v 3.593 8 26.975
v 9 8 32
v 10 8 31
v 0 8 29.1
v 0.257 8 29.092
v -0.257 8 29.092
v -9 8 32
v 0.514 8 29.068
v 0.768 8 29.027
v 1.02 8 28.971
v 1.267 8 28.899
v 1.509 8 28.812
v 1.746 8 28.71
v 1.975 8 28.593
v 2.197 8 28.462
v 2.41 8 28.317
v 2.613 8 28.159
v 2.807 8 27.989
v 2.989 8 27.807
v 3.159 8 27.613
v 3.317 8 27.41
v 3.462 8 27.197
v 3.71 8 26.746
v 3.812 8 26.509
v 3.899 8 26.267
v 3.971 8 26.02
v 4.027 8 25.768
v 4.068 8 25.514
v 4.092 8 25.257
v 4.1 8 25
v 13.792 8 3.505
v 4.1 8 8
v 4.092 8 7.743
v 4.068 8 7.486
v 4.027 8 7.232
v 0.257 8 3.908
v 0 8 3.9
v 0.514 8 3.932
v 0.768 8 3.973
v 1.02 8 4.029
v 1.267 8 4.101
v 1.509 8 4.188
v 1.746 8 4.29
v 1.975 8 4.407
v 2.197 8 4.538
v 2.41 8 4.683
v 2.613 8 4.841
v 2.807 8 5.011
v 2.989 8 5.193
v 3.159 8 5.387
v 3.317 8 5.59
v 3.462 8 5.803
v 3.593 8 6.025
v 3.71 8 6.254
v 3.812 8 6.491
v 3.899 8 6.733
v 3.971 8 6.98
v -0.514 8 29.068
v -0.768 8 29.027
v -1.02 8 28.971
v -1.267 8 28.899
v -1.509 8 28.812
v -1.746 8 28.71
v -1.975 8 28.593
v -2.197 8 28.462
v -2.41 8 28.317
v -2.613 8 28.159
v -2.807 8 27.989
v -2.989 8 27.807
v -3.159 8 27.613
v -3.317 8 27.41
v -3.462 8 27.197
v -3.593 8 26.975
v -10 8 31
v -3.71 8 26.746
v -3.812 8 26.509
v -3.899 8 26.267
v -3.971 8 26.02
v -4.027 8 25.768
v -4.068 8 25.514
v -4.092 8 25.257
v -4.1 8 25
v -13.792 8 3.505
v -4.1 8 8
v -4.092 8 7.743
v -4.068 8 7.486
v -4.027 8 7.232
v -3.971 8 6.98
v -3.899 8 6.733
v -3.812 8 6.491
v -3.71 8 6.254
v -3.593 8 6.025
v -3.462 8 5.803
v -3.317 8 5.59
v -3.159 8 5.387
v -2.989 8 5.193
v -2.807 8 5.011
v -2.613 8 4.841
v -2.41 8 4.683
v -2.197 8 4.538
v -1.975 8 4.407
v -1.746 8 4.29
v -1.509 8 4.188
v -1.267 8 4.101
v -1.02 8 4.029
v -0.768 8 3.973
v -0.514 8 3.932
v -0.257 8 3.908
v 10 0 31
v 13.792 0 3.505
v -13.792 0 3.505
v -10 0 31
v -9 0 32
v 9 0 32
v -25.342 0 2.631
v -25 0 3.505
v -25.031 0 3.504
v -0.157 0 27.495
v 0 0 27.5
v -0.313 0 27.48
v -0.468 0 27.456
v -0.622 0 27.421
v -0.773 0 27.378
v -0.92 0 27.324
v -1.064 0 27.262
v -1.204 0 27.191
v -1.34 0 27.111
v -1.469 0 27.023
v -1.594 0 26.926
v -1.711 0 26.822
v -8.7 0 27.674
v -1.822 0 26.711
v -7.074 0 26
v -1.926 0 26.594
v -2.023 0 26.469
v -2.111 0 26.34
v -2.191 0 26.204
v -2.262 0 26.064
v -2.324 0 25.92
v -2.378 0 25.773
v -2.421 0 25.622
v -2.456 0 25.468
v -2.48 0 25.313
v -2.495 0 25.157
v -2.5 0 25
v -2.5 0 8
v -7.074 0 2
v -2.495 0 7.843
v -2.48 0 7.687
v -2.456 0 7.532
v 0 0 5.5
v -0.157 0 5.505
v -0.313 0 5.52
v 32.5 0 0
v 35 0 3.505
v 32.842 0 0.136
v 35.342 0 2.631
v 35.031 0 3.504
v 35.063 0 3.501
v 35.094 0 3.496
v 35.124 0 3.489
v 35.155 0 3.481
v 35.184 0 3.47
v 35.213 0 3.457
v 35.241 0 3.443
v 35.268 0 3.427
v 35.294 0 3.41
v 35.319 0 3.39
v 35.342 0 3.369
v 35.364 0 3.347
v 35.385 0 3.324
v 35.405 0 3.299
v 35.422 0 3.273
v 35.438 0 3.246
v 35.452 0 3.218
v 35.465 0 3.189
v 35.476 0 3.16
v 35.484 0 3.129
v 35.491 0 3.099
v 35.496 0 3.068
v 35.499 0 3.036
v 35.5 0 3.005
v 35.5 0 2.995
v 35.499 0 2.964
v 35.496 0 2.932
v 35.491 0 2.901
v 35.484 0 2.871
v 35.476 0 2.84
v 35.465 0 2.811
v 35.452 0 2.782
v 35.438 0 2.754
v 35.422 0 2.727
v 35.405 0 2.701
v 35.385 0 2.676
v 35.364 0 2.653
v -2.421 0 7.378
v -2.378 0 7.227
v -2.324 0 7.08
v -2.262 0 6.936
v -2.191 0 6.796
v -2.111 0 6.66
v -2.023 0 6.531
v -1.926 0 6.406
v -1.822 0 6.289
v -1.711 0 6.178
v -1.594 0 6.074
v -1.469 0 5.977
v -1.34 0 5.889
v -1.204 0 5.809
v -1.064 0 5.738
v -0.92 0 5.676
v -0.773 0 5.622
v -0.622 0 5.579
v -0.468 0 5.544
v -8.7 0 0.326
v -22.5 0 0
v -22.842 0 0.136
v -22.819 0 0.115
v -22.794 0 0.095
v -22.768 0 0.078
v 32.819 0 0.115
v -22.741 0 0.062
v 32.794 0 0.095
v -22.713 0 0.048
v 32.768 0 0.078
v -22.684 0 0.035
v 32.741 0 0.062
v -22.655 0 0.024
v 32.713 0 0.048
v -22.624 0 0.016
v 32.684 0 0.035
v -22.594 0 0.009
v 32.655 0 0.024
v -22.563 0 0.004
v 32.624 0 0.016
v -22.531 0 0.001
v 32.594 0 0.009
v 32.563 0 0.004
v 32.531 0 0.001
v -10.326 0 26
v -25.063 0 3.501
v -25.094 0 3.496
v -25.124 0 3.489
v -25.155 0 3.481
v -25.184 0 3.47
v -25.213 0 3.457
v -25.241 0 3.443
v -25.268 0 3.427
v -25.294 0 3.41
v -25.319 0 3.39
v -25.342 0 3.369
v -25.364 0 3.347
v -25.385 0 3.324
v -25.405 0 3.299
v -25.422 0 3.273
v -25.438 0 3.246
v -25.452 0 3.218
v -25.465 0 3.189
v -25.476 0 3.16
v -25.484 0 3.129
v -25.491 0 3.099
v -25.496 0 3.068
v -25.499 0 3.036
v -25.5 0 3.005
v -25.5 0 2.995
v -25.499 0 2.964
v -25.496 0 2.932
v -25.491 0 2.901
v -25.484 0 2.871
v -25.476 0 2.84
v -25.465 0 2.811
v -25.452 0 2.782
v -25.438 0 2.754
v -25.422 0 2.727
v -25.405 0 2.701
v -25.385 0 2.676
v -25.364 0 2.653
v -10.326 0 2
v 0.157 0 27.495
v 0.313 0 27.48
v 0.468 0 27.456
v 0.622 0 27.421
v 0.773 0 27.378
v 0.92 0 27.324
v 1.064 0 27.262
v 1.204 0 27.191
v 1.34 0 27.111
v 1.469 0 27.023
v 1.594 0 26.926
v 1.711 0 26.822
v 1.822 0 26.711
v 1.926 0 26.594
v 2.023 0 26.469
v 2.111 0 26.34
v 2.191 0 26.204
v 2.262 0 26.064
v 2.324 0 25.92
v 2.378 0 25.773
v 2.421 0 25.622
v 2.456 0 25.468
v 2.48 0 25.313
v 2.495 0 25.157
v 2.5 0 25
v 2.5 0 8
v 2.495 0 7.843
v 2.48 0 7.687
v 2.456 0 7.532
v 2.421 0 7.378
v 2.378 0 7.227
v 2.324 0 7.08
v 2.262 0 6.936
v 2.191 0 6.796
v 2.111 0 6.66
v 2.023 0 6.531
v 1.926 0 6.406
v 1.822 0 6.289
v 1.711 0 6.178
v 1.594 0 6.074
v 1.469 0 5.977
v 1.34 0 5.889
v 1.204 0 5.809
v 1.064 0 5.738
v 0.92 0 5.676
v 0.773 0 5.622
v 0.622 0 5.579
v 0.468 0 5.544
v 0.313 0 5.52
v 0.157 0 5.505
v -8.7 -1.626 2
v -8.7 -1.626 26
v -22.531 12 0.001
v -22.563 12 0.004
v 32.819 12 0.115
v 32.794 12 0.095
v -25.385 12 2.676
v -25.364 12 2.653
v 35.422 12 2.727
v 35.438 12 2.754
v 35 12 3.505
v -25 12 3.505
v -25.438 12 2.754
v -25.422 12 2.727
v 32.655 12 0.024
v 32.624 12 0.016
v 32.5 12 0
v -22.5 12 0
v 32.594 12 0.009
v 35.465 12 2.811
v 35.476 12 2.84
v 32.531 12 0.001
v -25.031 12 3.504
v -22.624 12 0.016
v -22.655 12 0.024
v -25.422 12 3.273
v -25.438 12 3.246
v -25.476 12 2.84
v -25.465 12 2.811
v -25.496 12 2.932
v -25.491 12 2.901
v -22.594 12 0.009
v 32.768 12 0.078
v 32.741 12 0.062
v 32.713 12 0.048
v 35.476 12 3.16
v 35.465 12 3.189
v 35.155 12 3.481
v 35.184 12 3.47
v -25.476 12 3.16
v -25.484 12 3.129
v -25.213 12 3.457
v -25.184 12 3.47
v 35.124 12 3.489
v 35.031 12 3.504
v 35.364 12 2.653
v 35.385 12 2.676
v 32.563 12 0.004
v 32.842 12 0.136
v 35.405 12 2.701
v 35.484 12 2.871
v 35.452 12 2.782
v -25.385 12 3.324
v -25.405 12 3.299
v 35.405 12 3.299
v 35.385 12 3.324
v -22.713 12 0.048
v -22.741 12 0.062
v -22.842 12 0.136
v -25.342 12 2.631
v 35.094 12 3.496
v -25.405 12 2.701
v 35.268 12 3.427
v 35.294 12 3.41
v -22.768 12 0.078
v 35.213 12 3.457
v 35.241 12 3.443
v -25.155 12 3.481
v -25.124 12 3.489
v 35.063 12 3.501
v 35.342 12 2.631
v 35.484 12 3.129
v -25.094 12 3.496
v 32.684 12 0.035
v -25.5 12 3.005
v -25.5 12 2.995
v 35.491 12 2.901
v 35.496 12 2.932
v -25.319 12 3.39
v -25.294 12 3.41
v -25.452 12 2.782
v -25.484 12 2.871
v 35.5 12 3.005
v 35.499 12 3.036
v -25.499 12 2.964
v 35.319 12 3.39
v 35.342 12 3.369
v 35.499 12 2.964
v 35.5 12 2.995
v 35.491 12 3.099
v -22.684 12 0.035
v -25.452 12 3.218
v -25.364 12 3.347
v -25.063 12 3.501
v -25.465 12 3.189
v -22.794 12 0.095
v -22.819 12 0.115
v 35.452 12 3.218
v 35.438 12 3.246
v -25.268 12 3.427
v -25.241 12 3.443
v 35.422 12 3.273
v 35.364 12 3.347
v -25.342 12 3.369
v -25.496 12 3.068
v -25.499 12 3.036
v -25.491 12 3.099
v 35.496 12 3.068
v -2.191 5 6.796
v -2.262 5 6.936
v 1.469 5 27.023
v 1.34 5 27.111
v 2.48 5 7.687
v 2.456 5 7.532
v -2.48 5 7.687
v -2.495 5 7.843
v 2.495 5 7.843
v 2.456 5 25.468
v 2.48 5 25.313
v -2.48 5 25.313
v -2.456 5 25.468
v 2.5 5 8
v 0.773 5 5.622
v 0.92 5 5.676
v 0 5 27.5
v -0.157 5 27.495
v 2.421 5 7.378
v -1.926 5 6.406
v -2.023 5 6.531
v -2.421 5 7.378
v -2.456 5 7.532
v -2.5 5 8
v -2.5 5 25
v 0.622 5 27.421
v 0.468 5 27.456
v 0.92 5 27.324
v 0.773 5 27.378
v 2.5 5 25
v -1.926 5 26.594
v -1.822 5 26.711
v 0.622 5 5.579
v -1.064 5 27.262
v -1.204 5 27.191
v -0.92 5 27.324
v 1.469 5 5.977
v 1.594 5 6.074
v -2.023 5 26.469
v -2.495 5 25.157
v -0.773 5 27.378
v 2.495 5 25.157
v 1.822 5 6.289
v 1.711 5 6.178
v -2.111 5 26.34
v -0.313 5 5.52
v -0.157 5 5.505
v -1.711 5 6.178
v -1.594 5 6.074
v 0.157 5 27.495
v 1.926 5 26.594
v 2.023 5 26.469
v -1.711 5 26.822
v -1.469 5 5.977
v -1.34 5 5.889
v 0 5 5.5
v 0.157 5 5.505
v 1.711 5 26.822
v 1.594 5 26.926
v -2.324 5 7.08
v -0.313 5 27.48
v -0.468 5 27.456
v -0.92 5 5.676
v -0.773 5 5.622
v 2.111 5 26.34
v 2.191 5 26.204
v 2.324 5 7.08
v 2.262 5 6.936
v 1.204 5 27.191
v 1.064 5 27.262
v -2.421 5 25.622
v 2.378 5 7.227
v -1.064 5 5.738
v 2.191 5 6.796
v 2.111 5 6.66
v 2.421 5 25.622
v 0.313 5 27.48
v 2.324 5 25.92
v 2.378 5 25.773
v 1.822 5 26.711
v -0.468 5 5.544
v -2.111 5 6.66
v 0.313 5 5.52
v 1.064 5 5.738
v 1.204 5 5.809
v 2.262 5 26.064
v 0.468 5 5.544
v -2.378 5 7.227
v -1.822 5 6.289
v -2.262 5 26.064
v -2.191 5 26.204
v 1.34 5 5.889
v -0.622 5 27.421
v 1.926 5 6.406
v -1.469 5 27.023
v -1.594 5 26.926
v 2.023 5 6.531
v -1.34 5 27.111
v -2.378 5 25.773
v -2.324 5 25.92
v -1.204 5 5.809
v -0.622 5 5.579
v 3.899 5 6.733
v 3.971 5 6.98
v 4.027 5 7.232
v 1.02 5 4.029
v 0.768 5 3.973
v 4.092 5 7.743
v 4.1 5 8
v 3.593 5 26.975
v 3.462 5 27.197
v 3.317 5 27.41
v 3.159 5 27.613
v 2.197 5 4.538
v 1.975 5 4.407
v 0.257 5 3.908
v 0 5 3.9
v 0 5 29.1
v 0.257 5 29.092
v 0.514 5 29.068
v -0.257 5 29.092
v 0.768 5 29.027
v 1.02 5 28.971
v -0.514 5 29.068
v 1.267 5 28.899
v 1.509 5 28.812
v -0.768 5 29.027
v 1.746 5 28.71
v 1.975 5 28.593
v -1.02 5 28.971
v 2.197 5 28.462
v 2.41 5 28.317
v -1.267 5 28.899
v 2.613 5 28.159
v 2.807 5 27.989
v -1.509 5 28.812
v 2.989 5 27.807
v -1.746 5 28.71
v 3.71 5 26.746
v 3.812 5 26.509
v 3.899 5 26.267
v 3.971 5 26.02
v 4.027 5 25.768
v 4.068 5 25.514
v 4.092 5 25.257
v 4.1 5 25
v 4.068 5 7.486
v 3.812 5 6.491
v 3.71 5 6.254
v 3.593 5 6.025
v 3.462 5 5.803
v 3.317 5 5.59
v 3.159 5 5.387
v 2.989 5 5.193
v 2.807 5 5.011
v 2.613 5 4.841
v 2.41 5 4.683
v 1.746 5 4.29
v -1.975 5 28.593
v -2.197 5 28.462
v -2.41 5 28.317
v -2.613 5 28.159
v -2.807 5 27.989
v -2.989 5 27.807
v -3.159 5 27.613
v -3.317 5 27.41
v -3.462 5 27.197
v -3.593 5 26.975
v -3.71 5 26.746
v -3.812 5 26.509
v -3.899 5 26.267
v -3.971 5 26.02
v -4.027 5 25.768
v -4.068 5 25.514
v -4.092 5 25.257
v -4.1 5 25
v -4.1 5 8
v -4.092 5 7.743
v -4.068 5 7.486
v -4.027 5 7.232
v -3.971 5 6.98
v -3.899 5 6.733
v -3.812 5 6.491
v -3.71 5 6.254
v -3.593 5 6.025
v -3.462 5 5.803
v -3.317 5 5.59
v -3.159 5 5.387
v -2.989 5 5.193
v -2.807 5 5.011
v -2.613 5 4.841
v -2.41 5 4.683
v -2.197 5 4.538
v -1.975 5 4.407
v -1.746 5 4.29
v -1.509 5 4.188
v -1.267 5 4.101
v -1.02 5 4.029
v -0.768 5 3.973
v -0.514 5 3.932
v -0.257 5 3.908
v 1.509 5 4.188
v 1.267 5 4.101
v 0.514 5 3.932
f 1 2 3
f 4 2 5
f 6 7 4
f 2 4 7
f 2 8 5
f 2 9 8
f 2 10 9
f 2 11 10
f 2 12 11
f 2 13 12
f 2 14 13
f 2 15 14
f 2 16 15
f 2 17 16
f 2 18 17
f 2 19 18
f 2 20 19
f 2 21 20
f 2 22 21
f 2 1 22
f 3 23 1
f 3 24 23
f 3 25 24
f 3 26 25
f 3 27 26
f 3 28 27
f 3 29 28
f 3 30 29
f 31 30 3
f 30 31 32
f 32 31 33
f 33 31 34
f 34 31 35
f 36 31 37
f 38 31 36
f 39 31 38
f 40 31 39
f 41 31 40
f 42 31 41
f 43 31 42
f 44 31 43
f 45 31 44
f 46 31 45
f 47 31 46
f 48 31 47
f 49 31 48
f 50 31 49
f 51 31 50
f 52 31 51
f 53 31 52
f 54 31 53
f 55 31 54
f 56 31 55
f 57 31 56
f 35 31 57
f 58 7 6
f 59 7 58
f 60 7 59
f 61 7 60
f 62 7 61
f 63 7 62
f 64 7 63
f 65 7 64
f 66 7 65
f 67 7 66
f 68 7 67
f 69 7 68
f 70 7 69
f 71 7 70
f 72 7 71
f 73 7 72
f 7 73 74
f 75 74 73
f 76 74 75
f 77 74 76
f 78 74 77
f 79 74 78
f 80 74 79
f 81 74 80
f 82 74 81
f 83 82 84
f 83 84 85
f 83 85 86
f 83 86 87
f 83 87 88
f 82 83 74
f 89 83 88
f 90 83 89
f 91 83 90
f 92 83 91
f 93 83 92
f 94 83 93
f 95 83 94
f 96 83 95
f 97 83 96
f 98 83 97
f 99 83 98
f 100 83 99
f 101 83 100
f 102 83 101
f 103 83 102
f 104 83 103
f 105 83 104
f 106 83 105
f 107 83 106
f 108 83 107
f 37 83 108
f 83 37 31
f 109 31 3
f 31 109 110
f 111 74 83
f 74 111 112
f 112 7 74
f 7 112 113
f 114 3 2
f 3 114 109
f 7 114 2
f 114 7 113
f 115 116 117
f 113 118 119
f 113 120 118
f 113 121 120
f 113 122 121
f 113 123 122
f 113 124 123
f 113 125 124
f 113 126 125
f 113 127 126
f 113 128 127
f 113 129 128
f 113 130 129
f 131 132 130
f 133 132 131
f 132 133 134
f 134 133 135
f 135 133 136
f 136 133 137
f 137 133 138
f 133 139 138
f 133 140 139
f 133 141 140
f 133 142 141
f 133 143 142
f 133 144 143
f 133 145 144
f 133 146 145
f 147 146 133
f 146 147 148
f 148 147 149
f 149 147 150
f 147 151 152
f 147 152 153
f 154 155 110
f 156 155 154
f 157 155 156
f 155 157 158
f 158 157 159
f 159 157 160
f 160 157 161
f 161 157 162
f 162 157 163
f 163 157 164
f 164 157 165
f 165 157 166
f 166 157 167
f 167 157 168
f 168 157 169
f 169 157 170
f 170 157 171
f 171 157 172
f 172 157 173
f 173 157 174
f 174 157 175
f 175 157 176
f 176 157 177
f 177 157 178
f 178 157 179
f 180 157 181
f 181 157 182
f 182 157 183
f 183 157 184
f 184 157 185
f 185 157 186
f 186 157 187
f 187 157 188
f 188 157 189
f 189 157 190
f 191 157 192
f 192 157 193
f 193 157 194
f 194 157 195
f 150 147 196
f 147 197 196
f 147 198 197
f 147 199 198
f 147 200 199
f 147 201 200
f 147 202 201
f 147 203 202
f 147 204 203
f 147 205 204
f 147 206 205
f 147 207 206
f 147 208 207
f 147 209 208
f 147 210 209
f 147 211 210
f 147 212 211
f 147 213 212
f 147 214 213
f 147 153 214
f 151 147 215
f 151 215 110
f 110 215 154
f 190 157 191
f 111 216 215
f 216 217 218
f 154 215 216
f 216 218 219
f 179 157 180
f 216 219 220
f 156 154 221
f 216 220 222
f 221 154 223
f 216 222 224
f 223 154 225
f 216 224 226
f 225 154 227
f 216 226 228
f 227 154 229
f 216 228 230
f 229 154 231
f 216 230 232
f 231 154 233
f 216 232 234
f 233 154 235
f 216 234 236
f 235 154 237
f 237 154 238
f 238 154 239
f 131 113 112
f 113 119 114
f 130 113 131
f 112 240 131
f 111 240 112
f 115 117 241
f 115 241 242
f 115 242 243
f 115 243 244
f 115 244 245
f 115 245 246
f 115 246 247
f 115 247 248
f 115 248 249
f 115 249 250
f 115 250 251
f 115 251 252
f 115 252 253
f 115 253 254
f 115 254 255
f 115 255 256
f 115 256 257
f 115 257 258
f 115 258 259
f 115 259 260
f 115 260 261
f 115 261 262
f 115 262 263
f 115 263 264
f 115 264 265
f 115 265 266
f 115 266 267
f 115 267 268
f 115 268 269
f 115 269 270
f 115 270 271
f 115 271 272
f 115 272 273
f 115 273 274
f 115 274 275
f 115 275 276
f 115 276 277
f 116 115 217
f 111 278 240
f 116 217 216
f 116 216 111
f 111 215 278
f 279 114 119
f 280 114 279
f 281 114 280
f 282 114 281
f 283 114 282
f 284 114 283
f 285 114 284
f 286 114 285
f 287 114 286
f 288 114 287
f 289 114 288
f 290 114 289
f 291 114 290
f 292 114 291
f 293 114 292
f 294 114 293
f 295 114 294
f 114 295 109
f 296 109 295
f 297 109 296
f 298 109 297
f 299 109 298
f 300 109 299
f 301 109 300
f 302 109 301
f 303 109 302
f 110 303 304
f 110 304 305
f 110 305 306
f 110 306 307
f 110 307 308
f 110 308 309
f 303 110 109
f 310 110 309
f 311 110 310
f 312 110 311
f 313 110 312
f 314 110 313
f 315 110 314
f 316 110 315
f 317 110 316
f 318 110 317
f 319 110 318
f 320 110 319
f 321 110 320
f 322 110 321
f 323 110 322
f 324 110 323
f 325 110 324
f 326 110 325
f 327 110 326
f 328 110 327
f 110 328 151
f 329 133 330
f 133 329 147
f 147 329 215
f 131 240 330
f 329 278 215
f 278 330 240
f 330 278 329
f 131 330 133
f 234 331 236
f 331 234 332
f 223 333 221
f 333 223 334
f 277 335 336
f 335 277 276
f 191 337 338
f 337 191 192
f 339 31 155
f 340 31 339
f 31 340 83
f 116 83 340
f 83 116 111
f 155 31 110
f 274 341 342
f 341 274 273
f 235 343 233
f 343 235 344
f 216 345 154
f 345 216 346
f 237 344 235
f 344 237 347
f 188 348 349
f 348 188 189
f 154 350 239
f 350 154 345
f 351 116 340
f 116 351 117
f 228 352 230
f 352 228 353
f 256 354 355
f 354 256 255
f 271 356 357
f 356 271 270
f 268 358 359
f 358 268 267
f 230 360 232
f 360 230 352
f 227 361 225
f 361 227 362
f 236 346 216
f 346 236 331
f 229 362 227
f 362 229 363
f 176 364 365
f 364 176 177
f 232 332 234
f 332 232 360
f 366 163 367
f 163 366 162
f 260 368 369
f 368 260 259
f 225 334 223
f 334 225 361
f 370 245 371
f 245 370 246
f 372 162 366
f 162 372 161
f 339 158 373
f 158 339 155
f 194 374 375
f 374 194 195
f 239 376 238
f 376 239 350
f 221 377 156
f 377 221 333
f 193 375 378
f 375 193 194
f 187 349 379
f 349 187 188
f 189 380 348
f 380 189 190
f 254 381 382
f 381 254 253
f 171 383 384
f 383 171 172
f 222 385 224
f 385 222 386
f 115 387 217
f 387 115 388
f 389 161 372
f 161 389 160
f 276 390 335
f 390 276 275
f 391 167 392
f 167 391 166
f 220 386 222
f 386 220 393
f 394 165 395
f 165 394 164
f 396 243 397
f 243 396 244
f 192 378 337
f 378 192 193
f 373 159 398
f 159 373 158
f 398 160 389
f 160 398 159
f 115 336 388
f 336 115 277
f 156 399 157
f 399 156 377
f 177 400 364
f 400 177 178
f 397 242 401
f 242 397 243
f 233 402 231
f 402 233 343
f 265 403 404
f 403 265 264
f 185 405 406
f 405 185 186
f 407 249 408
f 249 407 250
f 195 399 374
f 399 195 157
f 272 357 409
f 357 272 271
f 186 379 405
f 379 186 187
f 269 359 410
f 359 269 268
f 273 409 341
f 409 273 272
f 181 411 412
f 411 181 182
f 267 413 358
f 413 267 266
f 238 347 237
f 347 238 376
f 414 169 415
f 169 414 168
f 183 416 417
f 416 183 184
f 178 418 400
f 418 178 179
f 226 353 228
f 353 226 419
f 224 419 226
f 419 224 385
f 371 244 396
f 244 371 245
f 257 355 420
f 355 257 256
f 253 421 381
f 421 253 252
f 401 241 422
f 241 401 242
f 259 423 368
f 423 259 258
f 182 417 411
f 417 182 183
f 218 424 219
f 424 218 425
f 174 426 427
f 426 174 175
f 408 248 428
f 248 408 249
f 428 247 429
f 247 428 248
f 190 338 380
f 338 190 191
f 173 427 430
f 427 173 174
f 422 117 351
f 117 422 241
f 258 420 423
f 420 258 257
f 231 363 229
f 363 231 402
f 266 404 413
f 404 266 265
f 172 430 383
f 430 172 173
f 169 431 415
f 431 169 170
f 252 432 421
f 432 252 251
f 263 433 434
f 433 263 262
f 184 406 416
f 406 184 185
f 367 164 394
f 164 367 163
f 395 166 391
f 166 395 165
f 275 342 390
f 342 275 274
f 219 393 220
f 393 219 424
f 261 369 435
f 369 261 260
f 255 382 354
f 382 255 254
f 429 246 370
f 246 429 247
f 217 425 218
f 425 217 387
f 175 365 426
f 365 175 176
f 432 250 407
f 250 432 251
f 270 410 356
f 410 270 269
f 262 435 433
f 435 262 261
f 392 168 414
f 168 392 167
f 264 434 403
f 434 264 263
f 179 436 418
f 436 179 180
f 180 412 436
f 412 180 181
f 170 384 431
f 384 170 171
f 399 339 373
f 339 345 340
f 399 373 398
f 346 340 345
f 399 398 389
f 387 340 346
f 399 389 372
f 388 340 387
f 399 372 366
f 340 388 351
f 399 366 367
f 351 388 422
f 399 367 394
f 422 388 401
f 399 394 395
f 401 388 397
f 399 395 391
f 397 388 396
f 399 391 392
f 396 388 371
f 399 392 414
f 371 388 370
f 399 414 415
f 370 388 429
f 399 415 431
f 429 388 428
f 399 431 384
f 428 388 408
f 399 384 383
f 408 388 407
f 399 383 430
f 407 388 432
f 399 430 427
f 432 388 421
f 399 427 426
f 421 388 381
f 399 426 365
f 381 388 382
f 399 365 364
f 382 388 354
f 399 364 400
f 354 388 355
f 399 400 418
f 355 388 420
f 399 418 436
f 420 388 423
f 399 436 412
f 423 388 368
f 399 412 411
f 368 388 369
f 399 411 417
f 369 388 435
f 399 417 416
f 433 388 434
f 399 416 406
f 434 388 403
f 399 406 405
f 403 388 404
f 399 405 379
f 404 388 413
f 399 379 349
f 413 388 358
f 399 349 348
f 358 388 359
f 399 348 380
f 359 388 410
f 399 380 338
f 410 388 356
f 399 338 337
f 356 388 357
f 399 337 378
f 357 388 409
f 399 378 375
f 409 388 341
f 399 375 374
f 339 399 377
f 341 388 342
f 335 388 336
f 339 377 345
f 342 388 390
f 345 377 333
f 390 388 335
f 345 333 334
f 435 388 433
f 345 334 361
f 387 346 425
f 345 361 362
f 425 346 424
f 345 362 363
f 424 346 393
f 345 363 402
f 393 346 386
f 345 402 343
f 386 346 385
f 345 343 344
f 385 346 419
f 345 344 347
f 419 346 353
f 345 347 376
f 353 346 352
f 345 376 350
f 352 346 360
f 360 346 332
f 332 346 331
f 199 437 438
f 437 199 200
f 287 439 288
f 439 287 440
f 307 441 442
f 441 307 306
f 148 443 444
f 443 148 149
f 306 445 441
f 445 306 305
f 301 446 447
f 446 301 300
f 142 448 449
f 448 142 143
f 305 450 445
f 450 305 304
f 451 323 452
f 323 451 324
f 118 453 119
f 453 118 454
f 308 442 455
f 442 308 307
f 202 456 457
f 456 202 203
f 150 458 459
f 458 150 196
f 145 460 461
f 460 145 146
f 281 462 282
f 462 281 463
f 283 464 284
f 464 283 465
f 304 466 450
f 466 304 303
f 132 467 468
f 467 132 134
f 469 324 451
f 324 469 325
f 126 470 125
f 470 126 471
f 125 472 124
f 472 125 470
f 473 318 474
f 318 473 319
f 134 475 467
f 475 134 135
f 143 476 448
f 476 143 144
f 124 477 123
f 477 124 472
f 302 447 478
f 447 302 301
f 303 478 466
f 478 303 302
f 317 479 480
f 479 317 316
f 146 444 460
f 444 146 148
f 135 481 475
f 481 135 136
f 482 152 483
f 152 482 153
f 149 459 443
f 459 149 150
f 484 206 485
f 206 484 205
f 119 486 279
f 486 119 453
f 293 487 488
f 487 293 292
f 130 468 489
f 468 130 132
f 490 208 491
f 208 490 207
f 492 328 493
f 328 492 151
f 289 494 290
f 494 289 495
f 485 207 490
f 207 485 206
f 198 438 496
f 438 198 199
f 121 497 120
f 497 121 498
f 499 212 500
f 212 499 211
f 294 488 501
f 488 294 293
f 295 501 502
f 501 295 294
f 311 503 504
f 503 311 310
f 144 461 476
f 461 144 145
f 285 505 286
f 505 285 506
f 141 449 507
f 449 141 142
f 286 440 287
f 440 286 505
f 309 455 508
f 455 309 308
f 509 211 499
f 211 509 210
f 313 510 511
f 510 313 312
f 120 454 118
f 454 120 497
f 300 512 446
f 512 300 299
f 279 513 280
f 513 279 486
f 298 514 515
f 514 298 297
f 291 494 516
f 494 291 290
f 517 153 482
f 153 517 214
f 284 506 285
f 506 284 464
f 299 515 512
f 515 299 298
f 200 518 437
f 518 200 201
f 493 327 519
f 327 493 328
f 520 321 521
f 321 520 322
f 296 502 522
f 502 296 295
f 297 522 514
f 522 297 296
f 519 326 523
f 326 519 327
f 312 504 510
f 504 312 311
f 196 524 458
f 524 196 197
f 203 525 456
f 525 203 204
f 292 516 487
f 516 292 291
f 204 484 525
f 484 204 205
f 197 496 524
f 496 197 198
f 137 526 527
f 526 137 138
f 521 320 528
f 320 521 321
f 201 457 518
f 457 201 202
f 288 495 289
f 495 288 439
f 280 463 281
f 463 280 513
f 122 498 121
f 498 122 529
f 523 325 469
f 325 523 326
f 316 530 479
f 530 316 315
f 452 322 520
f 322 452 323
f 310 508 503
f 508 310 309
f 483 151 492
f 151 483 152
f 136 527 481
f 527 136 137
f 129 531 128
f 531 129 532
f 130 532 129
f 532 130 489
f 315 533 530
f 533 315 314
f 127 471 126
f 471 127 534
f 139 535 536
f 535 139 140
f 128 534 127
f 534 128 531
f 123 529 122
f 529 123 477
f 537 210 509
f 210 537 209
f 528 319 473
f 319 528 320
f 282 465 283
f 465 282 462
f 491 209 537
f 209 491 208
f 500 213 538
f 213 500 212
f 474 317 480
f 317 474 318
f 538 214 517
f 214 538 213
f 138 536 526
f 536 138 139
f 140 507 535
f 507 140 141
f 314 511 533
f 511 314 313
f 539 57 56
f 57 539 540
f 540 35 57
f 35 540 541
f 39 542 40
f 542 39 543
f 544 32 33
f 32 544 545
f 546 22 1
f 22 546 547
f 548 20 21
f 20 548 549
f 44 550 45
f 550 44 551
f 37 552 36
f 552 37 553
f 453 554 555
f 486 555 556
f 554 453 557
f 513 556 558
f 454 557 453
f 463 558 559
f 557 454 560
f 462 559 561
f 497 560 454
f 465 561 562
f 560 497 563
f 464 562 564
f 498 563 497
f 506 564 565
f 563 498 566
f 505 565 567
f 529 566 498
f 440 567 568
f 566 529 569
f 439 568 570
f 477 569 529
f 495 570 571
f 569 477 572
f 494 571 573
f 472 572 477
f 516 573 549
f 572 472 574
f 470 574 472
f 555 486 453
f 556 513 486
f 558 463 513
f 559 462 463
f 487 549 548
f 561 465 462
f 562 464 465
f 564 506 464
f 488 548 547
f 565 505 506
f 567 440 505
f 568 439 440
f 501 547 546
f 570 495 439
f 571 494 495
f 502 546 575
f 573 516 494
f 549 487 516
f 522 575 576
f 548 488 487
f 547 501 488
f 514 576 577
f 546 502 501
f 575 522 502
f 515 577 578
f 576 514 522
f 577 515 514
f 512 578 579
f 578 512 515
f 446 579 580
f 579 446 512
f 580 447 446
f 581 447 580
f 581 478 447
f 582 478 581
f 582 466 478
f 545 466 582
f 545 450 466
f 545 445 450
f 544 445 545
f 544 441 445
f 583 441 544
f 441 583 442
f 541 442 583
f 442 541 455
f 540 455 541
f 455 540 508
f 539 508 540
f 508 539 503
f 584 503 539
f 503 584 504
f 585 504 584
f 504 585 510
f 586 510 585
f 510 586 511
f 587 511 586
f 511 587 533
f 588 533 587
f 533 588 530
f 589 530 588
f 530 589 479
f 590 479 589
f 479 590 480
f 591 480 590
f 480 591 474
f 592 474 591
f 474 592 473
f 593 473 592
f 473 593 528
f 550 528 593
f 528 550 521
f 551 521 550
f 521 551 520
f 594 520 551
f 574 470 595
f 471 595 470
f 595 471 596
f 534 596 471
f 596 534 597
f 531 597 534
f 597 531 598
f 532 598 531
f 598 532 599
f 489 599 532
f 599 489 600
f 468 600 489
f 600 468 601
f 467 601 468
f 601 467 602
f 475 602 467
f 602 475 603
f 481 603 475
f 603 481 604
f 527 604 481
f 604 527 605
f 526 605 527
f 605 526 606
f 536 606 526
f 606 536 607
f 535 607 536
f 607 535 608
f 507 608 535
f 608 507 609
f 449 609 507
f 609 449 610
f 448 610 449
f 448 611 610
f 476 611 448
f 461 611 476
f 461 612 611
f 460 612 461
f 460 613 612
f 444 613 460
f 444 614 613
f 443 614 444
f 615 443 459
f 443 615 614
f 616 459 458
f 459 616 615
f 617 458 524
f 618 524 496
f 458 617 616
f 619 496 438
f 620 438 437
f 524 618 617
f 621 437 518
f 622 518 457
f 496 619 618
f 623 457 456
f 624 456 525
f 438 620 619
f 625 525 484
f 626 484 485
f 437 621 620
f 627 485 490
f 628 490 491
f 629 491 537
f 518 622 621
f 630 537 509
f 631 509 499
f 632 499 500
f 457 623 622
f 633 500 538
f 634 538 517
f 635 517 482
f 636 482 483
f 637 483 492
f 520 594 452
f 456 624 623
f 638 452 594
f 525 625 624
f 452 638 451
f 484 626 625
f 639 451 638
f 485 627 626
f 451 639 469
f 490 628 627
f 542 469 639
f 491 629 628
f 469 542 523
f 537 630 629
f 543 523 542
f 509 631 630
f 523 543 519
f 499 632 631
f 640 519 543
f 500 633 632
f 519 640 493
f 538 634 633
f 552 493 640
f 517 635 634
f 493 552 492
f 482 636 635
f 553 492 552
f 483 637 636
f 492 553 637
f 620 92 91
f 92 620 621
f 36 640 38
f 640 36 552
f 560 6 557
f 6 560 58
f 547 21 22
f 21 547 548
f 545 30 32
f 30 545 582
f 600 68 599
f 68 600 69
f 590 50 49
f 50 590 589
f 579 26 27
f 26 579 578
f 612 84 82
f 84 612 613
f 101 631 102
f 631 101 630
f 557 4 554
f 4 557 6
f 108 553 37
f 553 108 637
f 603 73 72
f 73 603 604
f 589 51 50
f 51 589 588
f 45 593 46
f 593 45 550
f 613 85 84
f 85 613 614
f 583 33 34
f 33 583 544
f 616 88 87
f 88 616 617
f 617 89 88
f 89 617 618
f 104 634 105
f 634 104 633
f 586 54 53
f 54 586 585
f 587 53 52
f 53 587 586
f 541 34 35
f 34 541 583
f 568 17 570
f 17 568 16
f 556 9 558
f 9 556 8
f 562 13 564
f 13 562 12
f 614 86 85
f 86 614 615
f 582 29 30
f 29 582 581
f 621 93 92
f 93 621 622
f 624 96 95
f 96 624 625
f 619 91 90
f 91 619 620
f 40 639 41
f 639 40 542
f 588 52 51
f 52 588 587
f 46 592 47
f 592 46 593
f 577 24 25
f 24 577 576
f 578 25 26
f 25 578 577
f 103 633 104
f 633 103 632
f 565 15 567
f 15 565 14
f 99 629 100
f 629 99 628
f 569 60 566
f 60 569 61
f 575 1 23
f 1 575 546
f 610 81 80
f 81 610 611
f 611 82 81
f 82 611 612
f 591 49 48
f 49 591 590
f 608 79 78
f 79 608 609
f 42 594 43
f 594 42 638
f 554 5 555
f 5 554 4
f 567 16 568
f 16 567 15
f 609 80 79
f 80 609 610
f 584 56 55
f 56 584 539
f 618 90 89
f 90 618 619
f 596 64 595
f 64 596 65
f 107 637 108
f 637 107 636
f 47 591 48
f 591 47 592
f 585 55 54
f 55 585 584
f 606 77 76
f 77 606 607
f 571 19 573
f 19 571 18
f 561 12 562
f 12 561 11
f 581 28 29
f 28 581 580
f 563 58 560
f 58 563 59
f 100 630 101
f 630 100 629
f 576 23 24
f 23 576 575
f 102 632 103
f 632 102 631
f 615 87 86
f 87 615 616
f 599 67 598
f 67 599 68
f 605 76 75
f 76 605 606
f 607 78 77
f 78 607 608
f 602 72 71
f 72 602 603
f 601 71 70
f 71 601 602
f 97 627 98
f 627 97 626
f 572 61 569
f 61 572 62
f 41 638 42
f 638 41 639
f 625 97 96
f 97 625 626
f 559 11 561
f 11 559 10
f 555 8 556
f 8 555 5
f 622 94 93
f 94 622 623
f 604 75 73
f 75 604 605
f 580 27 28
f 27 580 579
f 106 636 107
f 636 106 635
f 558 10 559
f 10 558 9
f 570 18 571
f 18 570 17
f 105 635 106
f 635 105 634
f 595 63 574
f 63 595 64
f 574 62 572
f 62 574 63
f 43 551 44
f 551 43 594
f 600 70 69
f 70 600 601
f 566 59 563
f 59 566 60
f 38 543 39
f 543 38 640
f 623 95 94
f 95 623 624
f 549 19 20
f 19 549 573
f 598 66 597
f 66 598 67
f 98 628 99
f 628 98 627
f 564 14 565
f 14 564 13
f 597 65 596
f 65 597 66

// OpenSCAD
$fn=100;

difference(){
  union(){
    translate([-14,0,1])
      hull(){
        cube([28,8,1]);
        translate([4,0,29])
          cube([20,8,1]);
        translate([5,0,30])
          cube([18,8,1]);
        }
      hull(){
        translate([-8.7,0,14])
          rotate([0,0,45])
            cube([2.3,2.3,24], center=true);
        translate([-8.7,1.7,14])
          rotate([0,0,45])
            cube([2.3,2.3,27.5], center=true);
        }
    translate([5,6.5,1])
      minkowski(){
        hull(){
          translate([0,0,2])
            cube([60,11,.01], center=true);
          cube([55,11,1], center=true);
          }
        rotate([90,0,0])
          cylinder(r=0.5,h=1);
        }
    }
  union(){
    hull(){
      translate([0,0,25])
        rotate([90,0,0])
          cylinder(r=2.5, h=12, center=true);
      translate([0,0,8])
        rotate([90,0,0])
          cylinder(r=2.5, h=12, center=true);
      }
    translate([0,11,0])
      hull(){
        translate([0,0,25])
          rotate([90,0,0])
            cylinder(r=4.1, h=12, center=true);
        translate([0,0,8])
          rotate([90,0,0])
            cylinder(r=4.1, h=12, center=true);
        }
    }
  }
